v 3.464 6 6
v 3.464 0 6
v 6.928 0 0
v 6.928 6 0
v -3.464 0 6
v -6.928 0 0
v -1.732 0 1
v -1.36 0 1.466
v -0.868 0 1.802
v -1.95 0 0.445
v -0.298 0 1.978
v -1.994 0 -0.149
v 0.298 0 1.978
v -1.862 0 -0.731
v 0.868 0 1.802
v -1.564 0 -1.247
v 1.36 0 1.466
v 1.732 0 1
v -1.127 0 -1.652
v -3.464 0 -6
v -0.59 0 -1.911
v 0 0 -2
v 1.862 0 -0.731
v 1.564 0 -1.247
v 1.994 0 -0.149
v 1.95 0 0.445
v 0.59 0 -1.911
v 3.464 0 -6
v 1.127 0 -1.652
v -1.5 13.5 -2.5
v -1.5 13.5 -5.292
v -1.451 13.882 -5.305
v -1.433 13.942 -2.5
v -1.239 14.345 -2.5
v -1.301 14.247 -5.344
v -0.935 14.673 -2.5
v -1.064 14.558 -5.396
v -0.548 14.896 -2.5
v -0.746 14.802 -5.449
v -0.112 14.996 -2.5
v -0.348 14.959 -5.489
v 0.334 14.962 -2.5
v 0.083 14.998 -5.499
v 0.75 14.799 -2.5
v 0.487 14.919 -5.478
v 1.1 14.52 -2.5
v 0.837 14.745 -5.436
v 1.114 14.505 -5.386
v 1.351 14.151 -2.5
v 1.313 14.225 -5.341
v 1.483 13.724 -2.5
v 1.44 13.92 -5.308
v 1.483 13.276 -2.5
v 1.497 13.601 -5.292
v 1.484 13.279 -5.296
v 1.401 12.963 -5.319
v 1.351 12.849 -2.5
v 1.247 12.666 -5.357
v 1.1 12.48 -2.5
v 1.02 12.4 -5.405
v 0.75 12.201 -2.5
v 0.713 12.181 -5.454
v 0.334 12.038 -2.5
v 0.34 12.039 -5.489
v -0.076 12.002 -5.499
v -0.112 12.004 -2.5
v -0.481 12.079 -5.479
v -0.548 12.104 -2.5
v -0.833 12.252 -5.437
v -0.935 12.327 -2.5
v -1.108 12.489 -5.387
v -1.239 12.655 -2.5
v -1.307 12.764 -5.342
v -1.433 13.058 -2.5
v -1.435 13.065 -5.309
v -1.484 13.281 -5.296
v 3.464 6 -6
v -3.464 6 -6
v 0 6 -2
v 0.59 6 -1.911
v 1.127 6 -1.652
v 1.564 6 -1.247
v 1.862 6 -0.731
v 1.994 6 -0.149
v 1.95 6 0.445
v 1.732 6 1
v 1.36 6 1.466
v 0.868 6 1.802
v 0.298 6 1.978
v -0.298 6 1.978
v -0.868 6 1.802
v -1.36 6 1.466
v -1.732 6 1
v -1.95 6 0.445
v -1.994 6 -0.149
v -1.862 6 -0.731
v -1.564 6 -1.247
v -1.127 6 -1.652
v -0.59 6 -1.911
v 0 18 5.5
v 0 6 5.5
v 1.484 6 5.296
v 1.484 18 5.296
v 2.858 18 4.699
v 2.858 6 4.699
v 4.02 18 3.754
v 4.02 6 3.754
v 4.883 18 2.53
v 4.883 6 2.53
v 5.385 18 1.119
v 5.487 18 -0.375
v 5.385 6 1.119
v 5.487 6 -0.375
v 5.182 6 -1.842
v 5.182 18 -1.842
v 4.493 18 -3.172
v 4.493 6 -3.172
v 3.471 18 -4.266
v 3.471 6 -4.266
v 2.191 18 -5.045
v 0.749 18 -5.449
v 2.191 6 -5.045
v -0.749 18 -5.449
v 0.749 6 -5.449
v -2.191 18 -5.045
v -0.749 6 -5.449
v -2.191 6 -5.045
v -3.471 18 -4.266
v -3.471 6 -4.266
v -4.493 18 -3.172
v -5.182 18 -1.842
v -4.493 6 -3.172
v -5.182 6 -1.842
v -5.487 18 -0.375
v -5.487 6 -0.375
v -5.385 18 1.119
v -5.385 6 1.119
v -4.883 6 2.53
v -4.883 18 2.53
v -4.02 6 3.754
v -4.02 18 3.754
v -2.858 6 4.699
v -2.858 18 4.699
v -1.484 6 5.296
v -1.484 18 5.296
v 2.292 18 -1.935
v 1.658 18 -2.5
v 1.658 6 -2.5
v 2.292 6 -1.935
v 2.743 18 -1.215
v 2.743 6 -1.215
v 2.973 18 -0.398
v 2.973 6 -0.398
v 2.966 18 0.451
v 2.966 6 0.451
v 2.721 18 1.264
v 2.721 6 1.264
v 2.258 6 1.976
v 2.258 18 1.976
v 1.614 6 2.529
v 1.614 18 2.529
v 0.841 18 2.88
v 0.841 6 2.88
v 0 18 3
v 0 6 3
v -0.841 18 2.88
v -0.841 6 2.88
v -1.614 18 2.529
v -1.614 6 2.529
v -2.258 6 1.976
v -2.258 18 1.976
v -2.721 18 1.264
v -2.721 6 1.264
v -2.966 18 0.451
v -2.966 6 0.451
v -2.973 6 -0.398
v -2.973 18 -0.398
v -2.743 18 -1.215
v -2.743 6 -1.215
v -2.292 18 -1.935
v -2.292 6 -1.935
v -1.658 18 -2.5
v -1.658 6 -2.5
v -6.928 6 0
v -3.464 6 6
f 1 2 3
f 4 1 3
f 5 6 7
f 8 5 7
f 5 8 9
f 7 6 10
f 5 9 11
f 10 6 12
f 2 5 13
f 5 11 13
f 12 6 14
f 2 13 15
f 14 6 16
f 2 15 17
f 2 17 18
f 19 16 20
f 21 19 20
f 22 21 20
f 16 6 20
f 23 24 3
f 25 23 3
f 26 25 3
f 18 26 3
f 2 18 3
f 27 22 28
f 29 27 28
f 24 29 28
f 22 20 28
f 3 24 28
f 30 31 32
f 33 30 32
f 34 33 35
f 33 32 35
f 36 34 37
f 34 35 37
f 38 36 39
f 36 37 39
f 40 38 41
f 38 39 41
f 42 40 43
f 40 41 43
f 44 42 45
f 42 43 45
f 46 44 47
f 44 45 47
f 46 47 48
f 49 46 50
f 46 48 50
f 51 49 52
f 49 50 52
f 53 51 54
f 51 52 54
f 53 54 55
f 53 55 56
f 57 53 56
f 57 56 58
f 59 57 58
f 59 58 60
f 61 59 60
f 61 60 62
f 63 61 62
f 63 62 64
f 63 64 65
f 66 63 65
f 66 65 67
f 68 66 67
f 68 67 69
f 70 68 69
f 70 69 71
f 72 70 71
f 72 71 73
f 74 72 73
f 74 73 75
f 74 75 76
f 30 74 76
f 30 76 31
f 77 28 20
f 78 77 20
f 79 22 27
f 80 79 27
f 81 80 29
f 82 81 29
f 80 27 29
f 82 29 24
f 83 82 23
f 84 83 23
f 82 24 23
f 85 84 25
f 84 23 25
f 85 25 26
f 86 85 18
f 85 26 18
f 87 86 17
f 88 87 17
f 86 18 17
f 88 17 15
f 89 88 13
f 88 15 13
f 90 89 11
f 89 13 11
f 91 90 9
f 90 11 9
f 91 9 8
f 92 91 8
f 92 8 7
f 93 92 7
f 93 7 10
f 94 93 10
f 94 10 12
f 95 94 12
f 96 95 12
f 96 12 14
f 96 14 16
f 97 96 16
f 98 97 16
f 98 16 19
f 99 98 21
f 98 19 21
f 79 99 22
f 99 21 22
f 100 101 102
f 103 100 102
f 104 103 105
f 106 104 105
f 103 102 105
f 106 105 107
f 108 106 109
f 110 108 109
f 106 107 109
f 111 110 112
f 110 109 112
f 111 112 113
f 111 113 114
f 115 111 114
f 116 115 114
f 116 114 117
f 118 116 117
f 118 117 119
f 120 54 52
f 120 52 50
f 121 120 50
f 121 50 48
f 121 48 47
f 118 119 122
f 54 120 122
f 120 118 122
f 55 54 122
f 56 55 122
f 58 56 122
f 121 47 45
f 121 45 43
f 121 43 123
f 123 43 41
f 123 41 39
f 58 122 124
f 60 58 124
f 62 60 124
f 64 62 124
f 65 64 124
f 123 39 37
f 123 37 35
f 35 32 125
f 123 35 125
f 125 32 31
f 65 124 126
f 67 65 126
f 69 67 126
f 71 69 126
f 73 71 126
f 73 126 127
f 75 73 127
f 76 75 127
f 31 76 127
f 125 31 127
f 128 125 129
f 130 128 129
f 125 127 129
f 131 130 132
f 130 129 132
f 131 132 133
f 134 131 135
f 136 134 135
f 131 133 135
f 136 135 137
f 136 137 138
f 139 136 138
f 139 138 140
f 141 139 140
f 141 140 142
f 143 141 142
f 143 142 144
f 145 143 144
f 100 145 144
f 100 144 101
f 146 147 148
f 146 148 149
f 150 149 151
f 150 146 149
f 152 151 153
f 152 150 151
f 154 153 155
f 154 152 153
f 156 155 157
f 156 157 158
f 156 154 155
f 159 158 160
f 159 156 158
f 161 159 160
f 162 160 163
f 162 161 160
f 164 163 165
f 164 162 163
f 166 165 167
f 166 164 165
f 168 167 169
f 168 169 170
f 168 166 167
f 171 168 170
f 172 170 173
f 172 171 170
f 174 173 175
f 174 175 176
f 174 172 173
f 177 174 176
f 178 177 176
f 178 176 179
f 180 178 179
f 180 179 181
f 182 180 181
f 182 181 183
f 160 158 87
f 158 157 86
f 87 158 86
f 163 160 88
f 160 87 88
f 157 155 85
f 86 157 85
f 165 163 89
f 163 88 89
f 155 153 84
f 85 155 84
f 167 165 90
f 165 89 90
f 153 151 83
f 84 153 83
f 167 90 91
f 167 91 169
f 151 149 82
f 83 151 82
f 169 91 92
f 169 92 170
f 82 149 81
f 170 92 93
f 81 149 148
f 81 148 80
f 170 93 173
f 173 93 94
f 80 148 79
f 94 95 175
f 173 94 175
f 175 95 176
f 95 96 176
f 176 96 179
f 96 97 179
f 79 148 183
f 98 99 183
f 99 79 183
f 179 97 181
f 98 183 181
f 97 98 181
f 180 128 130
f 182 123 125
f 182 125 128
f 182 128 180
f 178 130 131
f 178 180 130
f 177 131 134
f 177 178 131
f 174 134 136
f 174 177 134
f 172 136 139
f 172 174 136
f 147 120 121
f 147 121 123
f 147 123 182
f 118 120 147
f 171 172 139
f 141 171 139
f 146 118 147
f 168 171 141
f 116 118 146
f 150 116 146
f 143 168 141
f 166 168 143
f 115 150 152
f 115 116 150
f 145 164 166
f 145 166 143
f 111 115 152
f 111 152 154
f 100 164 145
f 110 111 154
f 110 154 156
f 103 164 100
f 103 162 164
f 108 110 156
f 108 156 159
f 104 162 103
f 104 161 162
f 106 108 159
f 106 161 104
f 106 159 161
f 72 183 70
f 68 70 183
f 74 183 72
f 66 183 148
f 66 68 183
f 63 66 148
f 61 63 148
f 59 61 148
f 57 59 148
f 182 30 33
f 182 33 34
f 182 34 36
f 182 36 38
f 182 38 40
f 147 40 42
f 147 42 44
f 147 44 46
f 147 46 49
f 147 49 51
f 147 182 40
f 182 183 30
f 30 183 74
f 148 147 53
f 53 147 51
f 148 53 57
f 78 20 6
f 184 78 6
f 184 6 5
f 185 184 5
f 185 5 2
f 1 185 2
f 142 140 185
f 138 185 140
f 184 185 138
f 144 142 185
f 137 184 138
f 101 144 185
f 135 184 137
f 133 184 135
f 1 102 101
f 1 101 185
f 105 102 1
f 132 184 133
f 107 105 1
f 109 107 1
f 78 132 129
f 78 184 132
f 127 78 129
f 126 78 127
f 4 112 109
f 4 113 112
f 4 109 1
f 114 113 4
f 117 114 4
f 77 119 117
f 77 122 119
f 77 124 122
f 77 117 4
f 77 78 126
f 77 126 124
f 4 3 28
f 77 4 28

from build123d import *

# Parameters (mm, degrees)
SALIENTE_EXTRUIR1_DEPTH = 6
CROQUIS_BODY_R          = 5.5
SALIENTE_EXTRUIR2_DEPTH = 12
CORTAR_EXTRUIR1_DEPTH   = 12
CROQUIS5_R              = 1.5
CORTAR_EXTRUIR2_DEPTH   = 3.5
CROQUIS6_R              = 2
CORTAR_EXTRUIR3_DEPTH   = 6


with BuildPart() as part:
    # Croquis hex-head → Saliente-Extruir1 (new body)
    with BuildSketch(Plane(origin=(0, 0, 0), x_dir=(1, 0, 0), z_dir=(0, 1, 0))):
        Polygon((6.92820323, 0), (3.464101615, 6), (-3.464101615, 6), (-6.92820323, 0), (-3.464101615, -6), (3.464101615, -6), align=None)
    extrude(amount=SALIENTE_EXTRUIR1_DEPTH)

    # Croquis body → Saliente-Extruir2 (add)
    with BuildSketch(Plane(origin=(0, 6, 0), x_dir=(1, 0, 0), z_dir=(0, 1, 0))):
        with Locations(Location((0, 0, 0), (0, 0, 270))):
            Circle(CROQUIS_BODY_R)
    extrude(amount=SALIENTE_EXTRUIR2_DEPTH)

    # Croquis inner → Cortar-Extruir1 (cut)
    with BuildSketch(Plane(origin=(0, 18, 0), x_dir=(1, 0, 0), z_dir=(0, 1, 0))):
        with BuildLine():
            Line((-1.658312395, 2.5), (1.658312395, 2.5))
            ThreePointArc((1.658312395, 2.5), (0, -3), (-1.658312395, 2.5))
        make_face()
    extrude(amount=-CORTAR_EXTRUIR1_DEPTH, mode=Mode.SUBTRACT)

    # Croquis5 → Cortar-Extruir2 (cut)
    with BuildSketch(Plane(origin=(0, 0, -6), x_dir=(-1, 0, 0), z_dir=(0, 0, -1))):
        with Locations((0, 13.5)):
            Circle(CROQUIS5_R)
    extrude(amount=-CORTAR_EXTRUIR2_DEPTH, mode=Mode.SUBTRACT)

    # Croquis6 → Cortar-Extruir3 (cut)
    with BuildSketch(Plane.XZ):
        with Locations(Location((0, 0, 0), (0, 0, 270))):
            Circle(CROQUIS6_R)
    extrude(amount=-CORTAR_EXTRUIR3_DEPTH, mode=Mode.SUBTRACT)


solid = part.part
